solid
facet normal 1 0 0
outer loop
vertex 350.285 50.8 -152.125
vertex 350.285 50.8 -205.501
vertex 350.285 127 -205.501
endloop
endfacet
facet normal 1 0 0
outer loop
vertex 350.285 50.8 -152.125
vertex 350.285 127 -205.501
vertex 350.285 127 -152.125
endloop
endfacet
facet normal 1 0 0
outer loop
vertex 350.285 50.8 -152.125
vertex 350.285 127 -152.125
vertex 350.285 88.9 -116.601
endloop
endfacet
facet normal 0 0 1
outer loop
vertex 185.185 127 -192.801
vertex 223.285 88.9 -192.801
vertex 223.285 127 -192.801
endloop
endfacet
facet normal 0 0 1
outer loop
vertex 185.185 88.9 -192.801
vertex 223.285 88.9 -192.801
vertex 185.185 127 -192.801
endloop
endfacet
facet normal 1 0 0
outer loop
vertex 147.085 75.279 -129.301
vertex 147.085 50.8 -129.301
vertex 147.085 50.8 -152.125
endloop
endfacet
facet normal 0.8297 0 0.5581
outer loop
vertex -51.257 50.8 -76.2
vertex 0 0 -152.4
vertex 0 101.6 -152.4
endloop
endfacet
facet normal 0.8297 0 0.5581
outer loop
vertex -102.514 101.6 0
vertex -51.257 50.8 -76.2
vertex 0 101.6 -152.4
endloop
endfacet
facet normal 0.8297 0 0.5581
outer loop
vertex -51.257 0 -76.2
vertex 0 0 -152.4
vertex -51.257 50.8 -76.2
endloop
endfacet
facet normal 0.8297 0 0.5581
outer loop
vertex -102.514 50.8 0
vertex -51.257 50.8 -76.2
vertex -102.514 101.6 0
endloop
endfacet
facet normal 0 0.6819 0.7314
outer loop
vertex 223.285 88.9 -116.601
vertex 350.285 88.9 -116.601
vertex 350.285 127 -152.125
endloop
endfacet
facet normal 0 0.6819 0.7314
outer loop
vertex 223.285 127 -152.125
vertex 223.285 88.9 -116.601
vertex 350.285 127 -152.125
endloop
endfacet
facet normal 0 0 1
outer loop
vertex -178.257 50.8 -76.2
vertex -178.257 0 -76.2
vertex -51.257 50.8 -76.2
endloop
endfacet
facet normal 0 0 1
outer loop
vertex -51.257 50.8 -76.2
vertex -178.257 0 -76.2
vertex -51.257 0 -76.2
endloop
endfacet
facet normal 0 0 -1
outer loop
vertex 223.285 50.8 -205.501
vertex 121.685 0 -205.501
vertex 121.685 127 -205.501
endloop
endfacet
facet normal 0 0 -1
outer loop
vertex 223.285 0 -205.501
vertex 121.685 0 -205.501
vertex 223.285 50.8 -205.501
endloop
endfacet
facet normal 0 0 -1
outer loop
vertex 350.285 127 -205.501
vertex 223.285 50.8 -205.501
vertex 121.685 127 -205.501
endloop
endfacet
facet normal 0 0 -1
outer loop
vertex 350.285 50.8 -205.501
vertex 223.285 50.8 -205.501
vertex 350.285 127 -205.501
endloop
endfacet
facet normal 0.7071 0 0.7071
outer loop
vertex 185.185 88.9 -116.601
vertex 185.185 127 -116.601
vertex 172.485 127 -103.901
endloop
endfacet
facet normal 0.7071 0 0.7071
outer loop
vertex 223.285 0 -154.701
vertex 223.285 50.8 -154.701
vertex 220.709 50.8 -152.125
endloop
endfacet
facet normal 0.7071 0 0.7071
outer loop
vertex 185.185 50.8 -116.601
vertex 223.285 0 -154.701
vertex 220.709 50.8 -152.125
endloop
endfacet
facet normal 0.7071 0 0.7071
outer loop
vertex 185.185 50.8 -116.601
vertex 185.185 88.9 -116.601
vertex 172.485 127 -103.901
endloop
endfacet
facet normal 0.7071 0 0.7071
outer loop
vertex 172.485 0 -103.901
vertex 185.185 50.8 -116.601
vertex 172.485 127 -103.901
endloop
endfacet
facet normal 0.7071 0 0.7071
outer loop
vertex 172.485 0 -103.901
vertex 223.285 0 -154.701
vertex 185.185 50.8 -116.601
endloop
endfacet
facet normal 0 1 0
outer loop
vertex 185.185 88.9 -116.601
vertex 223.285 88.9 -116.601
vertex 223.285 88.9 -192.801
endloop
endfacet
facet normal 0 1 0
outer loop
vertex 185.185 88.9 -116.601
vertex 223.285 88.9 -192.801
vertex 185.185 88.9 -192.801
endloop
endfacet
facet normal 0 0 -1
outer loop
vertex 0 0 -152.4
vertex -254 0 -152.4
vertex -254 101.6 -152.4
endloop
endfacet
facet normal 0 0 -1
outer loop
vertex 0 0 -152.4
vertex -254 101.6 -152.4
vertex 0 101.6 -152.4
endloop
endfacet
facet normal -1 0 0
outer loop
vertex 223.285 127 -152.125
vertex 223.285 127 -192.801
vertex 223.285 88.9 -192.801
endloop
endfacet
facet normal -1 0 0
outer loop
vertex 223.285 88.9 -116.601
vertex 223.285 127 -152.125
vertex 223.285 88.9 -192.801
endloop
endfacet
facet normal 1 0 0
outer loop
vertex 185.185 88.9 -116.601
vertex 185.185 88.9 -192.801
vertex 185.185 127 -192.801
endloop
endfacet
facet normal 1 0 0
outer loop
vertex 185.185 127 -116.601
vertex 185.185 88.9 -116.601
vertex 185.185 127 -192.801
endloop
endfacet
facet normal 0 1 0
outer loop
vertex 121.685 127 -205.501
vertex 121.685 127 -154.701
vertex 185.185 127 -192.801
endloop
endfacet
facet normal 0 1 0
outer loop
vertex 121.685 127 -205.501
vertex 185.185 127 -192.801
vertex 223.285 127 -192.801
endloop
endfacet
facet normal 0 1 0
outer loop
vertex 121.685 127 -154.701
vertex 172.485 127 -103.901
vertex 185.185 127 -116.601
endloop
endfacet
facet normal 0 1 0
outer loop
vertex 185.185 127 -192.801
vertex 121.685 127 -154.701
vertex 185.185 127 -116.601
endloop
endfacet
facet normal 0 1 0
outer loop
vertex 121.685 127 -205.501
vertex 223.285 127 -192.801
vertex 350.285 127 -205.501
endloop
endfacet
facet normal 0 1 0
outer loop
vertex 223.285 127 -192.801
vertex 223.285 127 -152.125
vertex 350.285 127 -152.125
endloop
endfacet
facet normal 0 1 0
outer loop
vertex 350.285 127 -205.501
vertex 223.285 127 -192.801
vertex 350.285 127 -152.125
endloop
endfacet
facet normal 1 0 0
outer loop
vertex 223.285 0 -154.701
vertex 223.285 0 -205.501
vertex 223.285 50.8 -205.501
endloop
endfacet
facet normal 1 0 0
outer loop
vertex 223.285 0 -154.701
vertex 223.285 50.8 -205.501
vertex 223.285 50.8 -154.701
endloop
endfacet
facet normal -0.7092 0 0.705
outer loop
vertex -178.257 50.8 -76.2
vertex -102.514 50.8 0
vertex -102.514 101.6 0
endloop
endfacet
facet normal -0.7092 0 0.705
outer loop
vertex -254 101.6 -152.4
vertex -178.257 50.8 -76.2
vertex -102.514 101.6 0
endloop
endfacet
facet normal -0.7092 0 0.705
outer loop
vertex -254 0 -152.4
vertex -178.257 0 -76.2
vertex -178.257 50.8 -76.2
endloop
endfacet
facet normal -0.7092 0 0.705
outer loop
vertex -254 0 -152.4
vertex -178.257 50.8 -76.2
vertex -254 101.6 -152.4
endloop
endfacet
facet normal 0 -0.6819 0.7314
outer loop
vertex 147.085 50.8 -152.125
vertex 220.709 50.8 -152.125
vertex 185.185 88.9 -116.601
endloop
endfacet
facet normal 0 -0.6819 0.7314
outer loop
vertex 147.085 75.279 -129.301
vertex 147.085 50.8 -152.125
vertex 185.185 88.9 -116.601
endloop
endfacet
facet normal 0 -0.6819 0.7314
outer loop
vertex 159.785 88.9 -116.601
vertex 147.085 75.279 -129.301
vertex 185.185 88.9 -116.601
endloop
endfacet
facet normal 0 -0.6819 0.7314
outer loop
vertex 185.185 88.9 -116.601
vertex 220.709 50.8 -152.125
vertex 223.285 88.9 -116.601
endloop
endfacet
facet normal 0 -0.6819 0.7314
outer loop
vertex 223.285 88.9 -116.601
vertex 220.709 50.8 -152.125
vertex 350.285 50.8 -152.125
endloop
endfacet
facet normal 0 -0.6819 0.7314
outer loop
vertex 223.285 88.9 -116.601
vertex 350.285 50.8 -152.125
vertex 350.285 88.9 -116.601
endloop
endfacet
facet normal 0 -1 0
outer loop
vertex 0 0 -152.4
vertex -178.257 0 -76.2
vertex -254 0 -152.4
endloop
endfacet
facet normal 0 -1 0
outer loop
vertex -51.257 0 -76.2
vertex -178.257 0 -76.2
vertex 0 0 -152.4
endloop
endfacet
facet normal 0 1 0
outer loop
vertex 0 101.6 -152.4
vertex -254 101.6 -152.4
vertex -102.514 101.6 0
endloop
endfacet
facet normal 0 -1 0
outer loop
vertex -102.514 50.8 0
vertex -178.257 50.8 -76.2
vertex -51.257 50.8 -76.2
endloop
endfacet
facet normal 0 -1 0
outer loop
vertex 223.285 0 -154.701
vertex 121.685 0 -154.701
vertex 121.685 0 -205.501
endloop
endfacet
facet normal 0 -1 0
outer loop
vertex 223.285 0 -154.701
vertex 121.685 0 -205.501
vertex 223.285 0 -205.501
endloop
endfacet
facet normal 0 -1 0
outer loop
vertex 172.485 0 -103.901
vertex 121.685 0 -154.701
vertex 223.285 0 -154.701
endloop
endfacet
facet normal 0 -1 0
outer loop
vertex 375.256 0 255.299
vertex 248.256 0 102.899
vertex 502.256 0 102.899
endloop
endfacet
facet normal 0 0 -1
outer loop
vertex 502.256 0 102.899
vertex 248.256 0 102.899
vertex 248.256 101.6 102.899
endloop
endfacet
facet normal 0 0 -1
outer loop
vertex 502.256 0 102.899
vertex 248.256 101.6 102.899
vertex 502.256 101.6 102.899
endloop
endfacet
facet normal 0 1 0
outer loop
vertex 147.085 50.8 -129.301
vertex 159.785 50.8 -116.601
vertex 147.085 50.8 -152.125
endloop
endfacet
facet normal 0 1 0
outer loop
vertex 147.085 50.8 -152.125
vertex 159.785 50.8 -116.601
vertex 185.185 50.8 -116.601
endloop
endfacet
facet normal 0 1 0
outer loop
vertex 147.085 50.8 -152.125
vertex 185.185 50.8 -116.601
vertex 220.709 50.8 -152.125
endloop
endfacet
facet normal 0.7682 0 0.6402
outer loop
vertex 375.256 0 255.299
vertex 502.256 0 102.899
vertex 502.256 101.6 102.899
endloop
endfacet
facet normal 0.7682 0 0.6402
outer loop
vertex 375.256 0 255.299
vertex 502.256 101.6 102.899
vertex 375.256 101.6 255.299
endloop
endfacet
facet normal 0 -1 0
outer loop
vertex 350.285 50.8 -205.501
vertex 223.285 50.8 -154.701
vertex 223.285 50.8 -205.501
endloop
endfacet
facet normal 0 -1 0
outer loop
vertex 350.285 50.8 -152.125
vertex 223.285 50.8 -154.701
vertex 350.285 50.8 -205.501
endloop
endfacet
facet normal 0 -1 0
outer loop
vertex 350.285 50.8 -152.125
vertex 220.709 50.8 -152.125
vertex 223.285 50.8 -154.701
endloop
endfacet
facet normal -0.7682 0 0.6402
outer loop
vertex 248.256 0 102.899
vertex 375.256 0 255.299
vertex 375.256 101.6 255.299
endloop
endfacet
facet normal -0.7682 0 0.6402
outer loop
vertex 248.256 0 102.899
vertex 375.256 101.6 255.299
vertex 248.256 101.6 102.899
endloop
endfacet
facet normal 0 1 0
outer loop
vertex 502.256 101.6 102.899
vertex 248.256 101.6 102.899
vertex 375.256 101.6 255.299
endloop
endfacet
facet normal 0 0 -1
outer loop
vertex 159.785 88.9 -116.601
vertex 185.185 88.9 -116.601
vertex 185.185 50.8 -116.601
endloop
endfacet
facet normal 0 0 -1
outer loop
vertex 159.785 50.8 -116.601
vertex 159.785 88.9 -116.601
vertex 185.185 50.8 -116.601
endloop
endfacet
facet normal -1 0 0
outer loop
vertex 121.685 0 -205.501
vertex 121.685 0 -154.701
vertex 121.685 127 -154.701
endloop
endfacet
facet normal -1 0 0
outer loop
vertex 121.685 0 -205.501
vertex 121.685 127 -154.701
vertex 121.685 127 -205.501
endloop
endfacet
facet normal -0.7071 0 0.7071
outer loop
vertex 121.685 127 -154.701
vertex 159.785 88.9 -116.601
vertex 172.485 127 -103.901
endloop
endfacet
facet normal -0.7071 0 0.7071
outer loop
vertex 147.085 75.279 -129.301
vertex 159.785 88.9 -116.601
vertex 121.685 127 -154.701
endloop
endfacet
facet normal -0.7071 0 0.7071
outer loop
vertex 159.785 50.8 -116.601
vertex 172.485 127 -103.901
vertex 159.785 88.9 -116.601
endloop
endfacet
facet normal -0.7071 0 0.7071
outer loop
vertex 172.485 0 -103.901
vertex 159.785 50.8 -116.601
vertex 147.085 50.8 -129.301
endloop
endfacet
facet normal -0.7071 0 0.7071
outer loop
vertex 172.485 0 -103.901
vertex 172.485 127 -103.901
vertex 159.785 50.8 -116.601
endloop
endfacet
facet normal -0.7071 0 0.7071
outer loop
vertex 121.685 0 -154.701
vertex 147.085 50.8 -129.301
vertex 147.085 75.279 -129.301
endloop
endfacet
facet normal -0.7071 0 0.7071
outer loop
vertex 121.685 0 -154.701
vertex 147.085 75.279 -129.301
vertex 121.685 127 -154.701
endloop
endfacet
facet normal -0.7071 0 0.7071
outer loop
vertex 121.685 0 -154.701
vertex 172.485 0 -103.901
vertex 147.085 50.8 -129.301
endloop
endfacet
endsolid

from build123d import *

# Parameters (mm, degrees)
F1_DEPTH  = 101.6
F3_DEPTH  = 50.8
F5_DEPTH  = 101.6
F6_W      = 127
F6_H      = 50.8
F7_DEPTH  = 127
F8_DEPTH  = 50.8
F9_DEPTH  = 50.8
F11_DEPTH = 127
F12_DEPTH = 50.8
F13_DEPTH = 25.4
F14_DEPTH = 76.2


with BuildPart() as f1:
    # F0 (on Front) → F1 (new body)
    with BuildSketch(Plane.XZ):
        Polygon((-254, -152.4), (0, -152.4), (-51.2570695464, -76.2), (-178.2570695464, -76.2), align=None)
        Polygon((-178.2570695464, -76.2), (-51.2570695464, -76.2), (-102.5141390928, 0), align=None)
    extrude(amount=-F1_DEPTH)

    # F2 (on face) → F3 (cut)
    with BuildSketch(Plane.XZ):
        Polygon((-102.5141390928, 0), (-178.2570695464, -76.2), (-51.2570695464, -76.2), align=None)
    extrude(amount=-F3_DEPTH, mode=Mode.SUBTRACT)


with BuildPart() as f5:
    # F4 (on Front) → F5 (new body)
    with BuildSketch(Plane.XZ):
        Polygon((375.2559241105, 255.2993844524), (248.2559241105, 102.8993844524), (375.2559241105, 102.8993844524), align=None)
        Polygon((375.2559241105, 255.2993844524), (375.2559241105, 102.8993844524), (502.2559241105, 102.8993844524), align=None)
    extrude(amount=-F5_DEPTH)


with BuildPart() as f7:
    # F6 (on Front) → F7 (new body)
    with BuildSketch(Plane.XZ):
        Polygon((121.6853982925, -205.5009646893), (223.2853982925, -205.5009646893), (223.2853982925, -154.7009646893), (185.1853982925, -116.6009646893), (172.4853982925, -103.9009646893), (121.6853982925, -154.7009646893), align=None)
        Polygon((223.2853982925, -154.7009646893), (350.2853982925, -154.7009646893), (350.2853982925, -116.6009646893), (185.1853982925, -116.6009646893), align=None)
        with Locations((286.7853982925, -180.1009646893)):
            Rectangle(F6_W, F6_H)
    extrude(amount=-F7_DEPTH)

    # F6 (on Front) → F8 (cut)
    with BuildSketch(Plane.XZ):
        with Locations((286.7853982925, -180.1009646893)):
            Rectangle(F6_W, F6_H)
    extrude(amount=-F8_DEPTH, mode=Mode.SUBTRACT)

    # F6 (on Front) → F9 (cut)
    with BuildSketch(Plane.XZ):
        Polygon((223.2853982925, -154.7009646893), (350.2853982925, -154.7009646893), (350.2853982925, -116.6009646893), (185.1853982925, -116.6009646893), align=None)
    extrude(amount=-F9_DEPTH, mode=Mode.SUBTRACT)

    # F10 (on face) → F11 (cut)
    with BuildSketch(Plane.YZ.offset(350.2853982925)):
        Polygon((50.8, -116.6009646893), (50.8, -152.1249115467), (88.9, -116.6009646893), align=None)
        Polygon((127, -116.6009646893), (88.9, -116.6009646893), (127, -152.1249115467), align=None)
    extrude(amount=-F11_DEPTH, mode=Mode.SUBTRACT)

    # F12 (cut): a face of the model
    f12_faces = [f7.faces().sort_by_distance(p)[0] for p in [
        (223.2853982925, 63.5, -128.4422803084),
    ]]
    extrude(f12_faces, amount=-F12_DEPTH, mode=Mode.SUBTRACT)

    # F13 (cut): a face of the model
    f13_faces = [f7.faces().sort_by_distance(p)[0] for p in [
        (172.4853982925, 63.5, -128.4422803084),
    ]]
    extrude(f13_faces, amount=-F13_DEPTH, mode=Mode.SUBTRACT)

    # F14 (cut): a face of the model
    f14_faces = [f7.faces().sort_by_distance(p)[0] for p in [
        (204.2353982925, 107.95, -116.6009646893),
    ]]
    extrude(f14_faces, amount=-F14_DEPTH, mode=Mode.SUBTRACT)


solid = Compound([f1.part, f5.part, f7.part])
